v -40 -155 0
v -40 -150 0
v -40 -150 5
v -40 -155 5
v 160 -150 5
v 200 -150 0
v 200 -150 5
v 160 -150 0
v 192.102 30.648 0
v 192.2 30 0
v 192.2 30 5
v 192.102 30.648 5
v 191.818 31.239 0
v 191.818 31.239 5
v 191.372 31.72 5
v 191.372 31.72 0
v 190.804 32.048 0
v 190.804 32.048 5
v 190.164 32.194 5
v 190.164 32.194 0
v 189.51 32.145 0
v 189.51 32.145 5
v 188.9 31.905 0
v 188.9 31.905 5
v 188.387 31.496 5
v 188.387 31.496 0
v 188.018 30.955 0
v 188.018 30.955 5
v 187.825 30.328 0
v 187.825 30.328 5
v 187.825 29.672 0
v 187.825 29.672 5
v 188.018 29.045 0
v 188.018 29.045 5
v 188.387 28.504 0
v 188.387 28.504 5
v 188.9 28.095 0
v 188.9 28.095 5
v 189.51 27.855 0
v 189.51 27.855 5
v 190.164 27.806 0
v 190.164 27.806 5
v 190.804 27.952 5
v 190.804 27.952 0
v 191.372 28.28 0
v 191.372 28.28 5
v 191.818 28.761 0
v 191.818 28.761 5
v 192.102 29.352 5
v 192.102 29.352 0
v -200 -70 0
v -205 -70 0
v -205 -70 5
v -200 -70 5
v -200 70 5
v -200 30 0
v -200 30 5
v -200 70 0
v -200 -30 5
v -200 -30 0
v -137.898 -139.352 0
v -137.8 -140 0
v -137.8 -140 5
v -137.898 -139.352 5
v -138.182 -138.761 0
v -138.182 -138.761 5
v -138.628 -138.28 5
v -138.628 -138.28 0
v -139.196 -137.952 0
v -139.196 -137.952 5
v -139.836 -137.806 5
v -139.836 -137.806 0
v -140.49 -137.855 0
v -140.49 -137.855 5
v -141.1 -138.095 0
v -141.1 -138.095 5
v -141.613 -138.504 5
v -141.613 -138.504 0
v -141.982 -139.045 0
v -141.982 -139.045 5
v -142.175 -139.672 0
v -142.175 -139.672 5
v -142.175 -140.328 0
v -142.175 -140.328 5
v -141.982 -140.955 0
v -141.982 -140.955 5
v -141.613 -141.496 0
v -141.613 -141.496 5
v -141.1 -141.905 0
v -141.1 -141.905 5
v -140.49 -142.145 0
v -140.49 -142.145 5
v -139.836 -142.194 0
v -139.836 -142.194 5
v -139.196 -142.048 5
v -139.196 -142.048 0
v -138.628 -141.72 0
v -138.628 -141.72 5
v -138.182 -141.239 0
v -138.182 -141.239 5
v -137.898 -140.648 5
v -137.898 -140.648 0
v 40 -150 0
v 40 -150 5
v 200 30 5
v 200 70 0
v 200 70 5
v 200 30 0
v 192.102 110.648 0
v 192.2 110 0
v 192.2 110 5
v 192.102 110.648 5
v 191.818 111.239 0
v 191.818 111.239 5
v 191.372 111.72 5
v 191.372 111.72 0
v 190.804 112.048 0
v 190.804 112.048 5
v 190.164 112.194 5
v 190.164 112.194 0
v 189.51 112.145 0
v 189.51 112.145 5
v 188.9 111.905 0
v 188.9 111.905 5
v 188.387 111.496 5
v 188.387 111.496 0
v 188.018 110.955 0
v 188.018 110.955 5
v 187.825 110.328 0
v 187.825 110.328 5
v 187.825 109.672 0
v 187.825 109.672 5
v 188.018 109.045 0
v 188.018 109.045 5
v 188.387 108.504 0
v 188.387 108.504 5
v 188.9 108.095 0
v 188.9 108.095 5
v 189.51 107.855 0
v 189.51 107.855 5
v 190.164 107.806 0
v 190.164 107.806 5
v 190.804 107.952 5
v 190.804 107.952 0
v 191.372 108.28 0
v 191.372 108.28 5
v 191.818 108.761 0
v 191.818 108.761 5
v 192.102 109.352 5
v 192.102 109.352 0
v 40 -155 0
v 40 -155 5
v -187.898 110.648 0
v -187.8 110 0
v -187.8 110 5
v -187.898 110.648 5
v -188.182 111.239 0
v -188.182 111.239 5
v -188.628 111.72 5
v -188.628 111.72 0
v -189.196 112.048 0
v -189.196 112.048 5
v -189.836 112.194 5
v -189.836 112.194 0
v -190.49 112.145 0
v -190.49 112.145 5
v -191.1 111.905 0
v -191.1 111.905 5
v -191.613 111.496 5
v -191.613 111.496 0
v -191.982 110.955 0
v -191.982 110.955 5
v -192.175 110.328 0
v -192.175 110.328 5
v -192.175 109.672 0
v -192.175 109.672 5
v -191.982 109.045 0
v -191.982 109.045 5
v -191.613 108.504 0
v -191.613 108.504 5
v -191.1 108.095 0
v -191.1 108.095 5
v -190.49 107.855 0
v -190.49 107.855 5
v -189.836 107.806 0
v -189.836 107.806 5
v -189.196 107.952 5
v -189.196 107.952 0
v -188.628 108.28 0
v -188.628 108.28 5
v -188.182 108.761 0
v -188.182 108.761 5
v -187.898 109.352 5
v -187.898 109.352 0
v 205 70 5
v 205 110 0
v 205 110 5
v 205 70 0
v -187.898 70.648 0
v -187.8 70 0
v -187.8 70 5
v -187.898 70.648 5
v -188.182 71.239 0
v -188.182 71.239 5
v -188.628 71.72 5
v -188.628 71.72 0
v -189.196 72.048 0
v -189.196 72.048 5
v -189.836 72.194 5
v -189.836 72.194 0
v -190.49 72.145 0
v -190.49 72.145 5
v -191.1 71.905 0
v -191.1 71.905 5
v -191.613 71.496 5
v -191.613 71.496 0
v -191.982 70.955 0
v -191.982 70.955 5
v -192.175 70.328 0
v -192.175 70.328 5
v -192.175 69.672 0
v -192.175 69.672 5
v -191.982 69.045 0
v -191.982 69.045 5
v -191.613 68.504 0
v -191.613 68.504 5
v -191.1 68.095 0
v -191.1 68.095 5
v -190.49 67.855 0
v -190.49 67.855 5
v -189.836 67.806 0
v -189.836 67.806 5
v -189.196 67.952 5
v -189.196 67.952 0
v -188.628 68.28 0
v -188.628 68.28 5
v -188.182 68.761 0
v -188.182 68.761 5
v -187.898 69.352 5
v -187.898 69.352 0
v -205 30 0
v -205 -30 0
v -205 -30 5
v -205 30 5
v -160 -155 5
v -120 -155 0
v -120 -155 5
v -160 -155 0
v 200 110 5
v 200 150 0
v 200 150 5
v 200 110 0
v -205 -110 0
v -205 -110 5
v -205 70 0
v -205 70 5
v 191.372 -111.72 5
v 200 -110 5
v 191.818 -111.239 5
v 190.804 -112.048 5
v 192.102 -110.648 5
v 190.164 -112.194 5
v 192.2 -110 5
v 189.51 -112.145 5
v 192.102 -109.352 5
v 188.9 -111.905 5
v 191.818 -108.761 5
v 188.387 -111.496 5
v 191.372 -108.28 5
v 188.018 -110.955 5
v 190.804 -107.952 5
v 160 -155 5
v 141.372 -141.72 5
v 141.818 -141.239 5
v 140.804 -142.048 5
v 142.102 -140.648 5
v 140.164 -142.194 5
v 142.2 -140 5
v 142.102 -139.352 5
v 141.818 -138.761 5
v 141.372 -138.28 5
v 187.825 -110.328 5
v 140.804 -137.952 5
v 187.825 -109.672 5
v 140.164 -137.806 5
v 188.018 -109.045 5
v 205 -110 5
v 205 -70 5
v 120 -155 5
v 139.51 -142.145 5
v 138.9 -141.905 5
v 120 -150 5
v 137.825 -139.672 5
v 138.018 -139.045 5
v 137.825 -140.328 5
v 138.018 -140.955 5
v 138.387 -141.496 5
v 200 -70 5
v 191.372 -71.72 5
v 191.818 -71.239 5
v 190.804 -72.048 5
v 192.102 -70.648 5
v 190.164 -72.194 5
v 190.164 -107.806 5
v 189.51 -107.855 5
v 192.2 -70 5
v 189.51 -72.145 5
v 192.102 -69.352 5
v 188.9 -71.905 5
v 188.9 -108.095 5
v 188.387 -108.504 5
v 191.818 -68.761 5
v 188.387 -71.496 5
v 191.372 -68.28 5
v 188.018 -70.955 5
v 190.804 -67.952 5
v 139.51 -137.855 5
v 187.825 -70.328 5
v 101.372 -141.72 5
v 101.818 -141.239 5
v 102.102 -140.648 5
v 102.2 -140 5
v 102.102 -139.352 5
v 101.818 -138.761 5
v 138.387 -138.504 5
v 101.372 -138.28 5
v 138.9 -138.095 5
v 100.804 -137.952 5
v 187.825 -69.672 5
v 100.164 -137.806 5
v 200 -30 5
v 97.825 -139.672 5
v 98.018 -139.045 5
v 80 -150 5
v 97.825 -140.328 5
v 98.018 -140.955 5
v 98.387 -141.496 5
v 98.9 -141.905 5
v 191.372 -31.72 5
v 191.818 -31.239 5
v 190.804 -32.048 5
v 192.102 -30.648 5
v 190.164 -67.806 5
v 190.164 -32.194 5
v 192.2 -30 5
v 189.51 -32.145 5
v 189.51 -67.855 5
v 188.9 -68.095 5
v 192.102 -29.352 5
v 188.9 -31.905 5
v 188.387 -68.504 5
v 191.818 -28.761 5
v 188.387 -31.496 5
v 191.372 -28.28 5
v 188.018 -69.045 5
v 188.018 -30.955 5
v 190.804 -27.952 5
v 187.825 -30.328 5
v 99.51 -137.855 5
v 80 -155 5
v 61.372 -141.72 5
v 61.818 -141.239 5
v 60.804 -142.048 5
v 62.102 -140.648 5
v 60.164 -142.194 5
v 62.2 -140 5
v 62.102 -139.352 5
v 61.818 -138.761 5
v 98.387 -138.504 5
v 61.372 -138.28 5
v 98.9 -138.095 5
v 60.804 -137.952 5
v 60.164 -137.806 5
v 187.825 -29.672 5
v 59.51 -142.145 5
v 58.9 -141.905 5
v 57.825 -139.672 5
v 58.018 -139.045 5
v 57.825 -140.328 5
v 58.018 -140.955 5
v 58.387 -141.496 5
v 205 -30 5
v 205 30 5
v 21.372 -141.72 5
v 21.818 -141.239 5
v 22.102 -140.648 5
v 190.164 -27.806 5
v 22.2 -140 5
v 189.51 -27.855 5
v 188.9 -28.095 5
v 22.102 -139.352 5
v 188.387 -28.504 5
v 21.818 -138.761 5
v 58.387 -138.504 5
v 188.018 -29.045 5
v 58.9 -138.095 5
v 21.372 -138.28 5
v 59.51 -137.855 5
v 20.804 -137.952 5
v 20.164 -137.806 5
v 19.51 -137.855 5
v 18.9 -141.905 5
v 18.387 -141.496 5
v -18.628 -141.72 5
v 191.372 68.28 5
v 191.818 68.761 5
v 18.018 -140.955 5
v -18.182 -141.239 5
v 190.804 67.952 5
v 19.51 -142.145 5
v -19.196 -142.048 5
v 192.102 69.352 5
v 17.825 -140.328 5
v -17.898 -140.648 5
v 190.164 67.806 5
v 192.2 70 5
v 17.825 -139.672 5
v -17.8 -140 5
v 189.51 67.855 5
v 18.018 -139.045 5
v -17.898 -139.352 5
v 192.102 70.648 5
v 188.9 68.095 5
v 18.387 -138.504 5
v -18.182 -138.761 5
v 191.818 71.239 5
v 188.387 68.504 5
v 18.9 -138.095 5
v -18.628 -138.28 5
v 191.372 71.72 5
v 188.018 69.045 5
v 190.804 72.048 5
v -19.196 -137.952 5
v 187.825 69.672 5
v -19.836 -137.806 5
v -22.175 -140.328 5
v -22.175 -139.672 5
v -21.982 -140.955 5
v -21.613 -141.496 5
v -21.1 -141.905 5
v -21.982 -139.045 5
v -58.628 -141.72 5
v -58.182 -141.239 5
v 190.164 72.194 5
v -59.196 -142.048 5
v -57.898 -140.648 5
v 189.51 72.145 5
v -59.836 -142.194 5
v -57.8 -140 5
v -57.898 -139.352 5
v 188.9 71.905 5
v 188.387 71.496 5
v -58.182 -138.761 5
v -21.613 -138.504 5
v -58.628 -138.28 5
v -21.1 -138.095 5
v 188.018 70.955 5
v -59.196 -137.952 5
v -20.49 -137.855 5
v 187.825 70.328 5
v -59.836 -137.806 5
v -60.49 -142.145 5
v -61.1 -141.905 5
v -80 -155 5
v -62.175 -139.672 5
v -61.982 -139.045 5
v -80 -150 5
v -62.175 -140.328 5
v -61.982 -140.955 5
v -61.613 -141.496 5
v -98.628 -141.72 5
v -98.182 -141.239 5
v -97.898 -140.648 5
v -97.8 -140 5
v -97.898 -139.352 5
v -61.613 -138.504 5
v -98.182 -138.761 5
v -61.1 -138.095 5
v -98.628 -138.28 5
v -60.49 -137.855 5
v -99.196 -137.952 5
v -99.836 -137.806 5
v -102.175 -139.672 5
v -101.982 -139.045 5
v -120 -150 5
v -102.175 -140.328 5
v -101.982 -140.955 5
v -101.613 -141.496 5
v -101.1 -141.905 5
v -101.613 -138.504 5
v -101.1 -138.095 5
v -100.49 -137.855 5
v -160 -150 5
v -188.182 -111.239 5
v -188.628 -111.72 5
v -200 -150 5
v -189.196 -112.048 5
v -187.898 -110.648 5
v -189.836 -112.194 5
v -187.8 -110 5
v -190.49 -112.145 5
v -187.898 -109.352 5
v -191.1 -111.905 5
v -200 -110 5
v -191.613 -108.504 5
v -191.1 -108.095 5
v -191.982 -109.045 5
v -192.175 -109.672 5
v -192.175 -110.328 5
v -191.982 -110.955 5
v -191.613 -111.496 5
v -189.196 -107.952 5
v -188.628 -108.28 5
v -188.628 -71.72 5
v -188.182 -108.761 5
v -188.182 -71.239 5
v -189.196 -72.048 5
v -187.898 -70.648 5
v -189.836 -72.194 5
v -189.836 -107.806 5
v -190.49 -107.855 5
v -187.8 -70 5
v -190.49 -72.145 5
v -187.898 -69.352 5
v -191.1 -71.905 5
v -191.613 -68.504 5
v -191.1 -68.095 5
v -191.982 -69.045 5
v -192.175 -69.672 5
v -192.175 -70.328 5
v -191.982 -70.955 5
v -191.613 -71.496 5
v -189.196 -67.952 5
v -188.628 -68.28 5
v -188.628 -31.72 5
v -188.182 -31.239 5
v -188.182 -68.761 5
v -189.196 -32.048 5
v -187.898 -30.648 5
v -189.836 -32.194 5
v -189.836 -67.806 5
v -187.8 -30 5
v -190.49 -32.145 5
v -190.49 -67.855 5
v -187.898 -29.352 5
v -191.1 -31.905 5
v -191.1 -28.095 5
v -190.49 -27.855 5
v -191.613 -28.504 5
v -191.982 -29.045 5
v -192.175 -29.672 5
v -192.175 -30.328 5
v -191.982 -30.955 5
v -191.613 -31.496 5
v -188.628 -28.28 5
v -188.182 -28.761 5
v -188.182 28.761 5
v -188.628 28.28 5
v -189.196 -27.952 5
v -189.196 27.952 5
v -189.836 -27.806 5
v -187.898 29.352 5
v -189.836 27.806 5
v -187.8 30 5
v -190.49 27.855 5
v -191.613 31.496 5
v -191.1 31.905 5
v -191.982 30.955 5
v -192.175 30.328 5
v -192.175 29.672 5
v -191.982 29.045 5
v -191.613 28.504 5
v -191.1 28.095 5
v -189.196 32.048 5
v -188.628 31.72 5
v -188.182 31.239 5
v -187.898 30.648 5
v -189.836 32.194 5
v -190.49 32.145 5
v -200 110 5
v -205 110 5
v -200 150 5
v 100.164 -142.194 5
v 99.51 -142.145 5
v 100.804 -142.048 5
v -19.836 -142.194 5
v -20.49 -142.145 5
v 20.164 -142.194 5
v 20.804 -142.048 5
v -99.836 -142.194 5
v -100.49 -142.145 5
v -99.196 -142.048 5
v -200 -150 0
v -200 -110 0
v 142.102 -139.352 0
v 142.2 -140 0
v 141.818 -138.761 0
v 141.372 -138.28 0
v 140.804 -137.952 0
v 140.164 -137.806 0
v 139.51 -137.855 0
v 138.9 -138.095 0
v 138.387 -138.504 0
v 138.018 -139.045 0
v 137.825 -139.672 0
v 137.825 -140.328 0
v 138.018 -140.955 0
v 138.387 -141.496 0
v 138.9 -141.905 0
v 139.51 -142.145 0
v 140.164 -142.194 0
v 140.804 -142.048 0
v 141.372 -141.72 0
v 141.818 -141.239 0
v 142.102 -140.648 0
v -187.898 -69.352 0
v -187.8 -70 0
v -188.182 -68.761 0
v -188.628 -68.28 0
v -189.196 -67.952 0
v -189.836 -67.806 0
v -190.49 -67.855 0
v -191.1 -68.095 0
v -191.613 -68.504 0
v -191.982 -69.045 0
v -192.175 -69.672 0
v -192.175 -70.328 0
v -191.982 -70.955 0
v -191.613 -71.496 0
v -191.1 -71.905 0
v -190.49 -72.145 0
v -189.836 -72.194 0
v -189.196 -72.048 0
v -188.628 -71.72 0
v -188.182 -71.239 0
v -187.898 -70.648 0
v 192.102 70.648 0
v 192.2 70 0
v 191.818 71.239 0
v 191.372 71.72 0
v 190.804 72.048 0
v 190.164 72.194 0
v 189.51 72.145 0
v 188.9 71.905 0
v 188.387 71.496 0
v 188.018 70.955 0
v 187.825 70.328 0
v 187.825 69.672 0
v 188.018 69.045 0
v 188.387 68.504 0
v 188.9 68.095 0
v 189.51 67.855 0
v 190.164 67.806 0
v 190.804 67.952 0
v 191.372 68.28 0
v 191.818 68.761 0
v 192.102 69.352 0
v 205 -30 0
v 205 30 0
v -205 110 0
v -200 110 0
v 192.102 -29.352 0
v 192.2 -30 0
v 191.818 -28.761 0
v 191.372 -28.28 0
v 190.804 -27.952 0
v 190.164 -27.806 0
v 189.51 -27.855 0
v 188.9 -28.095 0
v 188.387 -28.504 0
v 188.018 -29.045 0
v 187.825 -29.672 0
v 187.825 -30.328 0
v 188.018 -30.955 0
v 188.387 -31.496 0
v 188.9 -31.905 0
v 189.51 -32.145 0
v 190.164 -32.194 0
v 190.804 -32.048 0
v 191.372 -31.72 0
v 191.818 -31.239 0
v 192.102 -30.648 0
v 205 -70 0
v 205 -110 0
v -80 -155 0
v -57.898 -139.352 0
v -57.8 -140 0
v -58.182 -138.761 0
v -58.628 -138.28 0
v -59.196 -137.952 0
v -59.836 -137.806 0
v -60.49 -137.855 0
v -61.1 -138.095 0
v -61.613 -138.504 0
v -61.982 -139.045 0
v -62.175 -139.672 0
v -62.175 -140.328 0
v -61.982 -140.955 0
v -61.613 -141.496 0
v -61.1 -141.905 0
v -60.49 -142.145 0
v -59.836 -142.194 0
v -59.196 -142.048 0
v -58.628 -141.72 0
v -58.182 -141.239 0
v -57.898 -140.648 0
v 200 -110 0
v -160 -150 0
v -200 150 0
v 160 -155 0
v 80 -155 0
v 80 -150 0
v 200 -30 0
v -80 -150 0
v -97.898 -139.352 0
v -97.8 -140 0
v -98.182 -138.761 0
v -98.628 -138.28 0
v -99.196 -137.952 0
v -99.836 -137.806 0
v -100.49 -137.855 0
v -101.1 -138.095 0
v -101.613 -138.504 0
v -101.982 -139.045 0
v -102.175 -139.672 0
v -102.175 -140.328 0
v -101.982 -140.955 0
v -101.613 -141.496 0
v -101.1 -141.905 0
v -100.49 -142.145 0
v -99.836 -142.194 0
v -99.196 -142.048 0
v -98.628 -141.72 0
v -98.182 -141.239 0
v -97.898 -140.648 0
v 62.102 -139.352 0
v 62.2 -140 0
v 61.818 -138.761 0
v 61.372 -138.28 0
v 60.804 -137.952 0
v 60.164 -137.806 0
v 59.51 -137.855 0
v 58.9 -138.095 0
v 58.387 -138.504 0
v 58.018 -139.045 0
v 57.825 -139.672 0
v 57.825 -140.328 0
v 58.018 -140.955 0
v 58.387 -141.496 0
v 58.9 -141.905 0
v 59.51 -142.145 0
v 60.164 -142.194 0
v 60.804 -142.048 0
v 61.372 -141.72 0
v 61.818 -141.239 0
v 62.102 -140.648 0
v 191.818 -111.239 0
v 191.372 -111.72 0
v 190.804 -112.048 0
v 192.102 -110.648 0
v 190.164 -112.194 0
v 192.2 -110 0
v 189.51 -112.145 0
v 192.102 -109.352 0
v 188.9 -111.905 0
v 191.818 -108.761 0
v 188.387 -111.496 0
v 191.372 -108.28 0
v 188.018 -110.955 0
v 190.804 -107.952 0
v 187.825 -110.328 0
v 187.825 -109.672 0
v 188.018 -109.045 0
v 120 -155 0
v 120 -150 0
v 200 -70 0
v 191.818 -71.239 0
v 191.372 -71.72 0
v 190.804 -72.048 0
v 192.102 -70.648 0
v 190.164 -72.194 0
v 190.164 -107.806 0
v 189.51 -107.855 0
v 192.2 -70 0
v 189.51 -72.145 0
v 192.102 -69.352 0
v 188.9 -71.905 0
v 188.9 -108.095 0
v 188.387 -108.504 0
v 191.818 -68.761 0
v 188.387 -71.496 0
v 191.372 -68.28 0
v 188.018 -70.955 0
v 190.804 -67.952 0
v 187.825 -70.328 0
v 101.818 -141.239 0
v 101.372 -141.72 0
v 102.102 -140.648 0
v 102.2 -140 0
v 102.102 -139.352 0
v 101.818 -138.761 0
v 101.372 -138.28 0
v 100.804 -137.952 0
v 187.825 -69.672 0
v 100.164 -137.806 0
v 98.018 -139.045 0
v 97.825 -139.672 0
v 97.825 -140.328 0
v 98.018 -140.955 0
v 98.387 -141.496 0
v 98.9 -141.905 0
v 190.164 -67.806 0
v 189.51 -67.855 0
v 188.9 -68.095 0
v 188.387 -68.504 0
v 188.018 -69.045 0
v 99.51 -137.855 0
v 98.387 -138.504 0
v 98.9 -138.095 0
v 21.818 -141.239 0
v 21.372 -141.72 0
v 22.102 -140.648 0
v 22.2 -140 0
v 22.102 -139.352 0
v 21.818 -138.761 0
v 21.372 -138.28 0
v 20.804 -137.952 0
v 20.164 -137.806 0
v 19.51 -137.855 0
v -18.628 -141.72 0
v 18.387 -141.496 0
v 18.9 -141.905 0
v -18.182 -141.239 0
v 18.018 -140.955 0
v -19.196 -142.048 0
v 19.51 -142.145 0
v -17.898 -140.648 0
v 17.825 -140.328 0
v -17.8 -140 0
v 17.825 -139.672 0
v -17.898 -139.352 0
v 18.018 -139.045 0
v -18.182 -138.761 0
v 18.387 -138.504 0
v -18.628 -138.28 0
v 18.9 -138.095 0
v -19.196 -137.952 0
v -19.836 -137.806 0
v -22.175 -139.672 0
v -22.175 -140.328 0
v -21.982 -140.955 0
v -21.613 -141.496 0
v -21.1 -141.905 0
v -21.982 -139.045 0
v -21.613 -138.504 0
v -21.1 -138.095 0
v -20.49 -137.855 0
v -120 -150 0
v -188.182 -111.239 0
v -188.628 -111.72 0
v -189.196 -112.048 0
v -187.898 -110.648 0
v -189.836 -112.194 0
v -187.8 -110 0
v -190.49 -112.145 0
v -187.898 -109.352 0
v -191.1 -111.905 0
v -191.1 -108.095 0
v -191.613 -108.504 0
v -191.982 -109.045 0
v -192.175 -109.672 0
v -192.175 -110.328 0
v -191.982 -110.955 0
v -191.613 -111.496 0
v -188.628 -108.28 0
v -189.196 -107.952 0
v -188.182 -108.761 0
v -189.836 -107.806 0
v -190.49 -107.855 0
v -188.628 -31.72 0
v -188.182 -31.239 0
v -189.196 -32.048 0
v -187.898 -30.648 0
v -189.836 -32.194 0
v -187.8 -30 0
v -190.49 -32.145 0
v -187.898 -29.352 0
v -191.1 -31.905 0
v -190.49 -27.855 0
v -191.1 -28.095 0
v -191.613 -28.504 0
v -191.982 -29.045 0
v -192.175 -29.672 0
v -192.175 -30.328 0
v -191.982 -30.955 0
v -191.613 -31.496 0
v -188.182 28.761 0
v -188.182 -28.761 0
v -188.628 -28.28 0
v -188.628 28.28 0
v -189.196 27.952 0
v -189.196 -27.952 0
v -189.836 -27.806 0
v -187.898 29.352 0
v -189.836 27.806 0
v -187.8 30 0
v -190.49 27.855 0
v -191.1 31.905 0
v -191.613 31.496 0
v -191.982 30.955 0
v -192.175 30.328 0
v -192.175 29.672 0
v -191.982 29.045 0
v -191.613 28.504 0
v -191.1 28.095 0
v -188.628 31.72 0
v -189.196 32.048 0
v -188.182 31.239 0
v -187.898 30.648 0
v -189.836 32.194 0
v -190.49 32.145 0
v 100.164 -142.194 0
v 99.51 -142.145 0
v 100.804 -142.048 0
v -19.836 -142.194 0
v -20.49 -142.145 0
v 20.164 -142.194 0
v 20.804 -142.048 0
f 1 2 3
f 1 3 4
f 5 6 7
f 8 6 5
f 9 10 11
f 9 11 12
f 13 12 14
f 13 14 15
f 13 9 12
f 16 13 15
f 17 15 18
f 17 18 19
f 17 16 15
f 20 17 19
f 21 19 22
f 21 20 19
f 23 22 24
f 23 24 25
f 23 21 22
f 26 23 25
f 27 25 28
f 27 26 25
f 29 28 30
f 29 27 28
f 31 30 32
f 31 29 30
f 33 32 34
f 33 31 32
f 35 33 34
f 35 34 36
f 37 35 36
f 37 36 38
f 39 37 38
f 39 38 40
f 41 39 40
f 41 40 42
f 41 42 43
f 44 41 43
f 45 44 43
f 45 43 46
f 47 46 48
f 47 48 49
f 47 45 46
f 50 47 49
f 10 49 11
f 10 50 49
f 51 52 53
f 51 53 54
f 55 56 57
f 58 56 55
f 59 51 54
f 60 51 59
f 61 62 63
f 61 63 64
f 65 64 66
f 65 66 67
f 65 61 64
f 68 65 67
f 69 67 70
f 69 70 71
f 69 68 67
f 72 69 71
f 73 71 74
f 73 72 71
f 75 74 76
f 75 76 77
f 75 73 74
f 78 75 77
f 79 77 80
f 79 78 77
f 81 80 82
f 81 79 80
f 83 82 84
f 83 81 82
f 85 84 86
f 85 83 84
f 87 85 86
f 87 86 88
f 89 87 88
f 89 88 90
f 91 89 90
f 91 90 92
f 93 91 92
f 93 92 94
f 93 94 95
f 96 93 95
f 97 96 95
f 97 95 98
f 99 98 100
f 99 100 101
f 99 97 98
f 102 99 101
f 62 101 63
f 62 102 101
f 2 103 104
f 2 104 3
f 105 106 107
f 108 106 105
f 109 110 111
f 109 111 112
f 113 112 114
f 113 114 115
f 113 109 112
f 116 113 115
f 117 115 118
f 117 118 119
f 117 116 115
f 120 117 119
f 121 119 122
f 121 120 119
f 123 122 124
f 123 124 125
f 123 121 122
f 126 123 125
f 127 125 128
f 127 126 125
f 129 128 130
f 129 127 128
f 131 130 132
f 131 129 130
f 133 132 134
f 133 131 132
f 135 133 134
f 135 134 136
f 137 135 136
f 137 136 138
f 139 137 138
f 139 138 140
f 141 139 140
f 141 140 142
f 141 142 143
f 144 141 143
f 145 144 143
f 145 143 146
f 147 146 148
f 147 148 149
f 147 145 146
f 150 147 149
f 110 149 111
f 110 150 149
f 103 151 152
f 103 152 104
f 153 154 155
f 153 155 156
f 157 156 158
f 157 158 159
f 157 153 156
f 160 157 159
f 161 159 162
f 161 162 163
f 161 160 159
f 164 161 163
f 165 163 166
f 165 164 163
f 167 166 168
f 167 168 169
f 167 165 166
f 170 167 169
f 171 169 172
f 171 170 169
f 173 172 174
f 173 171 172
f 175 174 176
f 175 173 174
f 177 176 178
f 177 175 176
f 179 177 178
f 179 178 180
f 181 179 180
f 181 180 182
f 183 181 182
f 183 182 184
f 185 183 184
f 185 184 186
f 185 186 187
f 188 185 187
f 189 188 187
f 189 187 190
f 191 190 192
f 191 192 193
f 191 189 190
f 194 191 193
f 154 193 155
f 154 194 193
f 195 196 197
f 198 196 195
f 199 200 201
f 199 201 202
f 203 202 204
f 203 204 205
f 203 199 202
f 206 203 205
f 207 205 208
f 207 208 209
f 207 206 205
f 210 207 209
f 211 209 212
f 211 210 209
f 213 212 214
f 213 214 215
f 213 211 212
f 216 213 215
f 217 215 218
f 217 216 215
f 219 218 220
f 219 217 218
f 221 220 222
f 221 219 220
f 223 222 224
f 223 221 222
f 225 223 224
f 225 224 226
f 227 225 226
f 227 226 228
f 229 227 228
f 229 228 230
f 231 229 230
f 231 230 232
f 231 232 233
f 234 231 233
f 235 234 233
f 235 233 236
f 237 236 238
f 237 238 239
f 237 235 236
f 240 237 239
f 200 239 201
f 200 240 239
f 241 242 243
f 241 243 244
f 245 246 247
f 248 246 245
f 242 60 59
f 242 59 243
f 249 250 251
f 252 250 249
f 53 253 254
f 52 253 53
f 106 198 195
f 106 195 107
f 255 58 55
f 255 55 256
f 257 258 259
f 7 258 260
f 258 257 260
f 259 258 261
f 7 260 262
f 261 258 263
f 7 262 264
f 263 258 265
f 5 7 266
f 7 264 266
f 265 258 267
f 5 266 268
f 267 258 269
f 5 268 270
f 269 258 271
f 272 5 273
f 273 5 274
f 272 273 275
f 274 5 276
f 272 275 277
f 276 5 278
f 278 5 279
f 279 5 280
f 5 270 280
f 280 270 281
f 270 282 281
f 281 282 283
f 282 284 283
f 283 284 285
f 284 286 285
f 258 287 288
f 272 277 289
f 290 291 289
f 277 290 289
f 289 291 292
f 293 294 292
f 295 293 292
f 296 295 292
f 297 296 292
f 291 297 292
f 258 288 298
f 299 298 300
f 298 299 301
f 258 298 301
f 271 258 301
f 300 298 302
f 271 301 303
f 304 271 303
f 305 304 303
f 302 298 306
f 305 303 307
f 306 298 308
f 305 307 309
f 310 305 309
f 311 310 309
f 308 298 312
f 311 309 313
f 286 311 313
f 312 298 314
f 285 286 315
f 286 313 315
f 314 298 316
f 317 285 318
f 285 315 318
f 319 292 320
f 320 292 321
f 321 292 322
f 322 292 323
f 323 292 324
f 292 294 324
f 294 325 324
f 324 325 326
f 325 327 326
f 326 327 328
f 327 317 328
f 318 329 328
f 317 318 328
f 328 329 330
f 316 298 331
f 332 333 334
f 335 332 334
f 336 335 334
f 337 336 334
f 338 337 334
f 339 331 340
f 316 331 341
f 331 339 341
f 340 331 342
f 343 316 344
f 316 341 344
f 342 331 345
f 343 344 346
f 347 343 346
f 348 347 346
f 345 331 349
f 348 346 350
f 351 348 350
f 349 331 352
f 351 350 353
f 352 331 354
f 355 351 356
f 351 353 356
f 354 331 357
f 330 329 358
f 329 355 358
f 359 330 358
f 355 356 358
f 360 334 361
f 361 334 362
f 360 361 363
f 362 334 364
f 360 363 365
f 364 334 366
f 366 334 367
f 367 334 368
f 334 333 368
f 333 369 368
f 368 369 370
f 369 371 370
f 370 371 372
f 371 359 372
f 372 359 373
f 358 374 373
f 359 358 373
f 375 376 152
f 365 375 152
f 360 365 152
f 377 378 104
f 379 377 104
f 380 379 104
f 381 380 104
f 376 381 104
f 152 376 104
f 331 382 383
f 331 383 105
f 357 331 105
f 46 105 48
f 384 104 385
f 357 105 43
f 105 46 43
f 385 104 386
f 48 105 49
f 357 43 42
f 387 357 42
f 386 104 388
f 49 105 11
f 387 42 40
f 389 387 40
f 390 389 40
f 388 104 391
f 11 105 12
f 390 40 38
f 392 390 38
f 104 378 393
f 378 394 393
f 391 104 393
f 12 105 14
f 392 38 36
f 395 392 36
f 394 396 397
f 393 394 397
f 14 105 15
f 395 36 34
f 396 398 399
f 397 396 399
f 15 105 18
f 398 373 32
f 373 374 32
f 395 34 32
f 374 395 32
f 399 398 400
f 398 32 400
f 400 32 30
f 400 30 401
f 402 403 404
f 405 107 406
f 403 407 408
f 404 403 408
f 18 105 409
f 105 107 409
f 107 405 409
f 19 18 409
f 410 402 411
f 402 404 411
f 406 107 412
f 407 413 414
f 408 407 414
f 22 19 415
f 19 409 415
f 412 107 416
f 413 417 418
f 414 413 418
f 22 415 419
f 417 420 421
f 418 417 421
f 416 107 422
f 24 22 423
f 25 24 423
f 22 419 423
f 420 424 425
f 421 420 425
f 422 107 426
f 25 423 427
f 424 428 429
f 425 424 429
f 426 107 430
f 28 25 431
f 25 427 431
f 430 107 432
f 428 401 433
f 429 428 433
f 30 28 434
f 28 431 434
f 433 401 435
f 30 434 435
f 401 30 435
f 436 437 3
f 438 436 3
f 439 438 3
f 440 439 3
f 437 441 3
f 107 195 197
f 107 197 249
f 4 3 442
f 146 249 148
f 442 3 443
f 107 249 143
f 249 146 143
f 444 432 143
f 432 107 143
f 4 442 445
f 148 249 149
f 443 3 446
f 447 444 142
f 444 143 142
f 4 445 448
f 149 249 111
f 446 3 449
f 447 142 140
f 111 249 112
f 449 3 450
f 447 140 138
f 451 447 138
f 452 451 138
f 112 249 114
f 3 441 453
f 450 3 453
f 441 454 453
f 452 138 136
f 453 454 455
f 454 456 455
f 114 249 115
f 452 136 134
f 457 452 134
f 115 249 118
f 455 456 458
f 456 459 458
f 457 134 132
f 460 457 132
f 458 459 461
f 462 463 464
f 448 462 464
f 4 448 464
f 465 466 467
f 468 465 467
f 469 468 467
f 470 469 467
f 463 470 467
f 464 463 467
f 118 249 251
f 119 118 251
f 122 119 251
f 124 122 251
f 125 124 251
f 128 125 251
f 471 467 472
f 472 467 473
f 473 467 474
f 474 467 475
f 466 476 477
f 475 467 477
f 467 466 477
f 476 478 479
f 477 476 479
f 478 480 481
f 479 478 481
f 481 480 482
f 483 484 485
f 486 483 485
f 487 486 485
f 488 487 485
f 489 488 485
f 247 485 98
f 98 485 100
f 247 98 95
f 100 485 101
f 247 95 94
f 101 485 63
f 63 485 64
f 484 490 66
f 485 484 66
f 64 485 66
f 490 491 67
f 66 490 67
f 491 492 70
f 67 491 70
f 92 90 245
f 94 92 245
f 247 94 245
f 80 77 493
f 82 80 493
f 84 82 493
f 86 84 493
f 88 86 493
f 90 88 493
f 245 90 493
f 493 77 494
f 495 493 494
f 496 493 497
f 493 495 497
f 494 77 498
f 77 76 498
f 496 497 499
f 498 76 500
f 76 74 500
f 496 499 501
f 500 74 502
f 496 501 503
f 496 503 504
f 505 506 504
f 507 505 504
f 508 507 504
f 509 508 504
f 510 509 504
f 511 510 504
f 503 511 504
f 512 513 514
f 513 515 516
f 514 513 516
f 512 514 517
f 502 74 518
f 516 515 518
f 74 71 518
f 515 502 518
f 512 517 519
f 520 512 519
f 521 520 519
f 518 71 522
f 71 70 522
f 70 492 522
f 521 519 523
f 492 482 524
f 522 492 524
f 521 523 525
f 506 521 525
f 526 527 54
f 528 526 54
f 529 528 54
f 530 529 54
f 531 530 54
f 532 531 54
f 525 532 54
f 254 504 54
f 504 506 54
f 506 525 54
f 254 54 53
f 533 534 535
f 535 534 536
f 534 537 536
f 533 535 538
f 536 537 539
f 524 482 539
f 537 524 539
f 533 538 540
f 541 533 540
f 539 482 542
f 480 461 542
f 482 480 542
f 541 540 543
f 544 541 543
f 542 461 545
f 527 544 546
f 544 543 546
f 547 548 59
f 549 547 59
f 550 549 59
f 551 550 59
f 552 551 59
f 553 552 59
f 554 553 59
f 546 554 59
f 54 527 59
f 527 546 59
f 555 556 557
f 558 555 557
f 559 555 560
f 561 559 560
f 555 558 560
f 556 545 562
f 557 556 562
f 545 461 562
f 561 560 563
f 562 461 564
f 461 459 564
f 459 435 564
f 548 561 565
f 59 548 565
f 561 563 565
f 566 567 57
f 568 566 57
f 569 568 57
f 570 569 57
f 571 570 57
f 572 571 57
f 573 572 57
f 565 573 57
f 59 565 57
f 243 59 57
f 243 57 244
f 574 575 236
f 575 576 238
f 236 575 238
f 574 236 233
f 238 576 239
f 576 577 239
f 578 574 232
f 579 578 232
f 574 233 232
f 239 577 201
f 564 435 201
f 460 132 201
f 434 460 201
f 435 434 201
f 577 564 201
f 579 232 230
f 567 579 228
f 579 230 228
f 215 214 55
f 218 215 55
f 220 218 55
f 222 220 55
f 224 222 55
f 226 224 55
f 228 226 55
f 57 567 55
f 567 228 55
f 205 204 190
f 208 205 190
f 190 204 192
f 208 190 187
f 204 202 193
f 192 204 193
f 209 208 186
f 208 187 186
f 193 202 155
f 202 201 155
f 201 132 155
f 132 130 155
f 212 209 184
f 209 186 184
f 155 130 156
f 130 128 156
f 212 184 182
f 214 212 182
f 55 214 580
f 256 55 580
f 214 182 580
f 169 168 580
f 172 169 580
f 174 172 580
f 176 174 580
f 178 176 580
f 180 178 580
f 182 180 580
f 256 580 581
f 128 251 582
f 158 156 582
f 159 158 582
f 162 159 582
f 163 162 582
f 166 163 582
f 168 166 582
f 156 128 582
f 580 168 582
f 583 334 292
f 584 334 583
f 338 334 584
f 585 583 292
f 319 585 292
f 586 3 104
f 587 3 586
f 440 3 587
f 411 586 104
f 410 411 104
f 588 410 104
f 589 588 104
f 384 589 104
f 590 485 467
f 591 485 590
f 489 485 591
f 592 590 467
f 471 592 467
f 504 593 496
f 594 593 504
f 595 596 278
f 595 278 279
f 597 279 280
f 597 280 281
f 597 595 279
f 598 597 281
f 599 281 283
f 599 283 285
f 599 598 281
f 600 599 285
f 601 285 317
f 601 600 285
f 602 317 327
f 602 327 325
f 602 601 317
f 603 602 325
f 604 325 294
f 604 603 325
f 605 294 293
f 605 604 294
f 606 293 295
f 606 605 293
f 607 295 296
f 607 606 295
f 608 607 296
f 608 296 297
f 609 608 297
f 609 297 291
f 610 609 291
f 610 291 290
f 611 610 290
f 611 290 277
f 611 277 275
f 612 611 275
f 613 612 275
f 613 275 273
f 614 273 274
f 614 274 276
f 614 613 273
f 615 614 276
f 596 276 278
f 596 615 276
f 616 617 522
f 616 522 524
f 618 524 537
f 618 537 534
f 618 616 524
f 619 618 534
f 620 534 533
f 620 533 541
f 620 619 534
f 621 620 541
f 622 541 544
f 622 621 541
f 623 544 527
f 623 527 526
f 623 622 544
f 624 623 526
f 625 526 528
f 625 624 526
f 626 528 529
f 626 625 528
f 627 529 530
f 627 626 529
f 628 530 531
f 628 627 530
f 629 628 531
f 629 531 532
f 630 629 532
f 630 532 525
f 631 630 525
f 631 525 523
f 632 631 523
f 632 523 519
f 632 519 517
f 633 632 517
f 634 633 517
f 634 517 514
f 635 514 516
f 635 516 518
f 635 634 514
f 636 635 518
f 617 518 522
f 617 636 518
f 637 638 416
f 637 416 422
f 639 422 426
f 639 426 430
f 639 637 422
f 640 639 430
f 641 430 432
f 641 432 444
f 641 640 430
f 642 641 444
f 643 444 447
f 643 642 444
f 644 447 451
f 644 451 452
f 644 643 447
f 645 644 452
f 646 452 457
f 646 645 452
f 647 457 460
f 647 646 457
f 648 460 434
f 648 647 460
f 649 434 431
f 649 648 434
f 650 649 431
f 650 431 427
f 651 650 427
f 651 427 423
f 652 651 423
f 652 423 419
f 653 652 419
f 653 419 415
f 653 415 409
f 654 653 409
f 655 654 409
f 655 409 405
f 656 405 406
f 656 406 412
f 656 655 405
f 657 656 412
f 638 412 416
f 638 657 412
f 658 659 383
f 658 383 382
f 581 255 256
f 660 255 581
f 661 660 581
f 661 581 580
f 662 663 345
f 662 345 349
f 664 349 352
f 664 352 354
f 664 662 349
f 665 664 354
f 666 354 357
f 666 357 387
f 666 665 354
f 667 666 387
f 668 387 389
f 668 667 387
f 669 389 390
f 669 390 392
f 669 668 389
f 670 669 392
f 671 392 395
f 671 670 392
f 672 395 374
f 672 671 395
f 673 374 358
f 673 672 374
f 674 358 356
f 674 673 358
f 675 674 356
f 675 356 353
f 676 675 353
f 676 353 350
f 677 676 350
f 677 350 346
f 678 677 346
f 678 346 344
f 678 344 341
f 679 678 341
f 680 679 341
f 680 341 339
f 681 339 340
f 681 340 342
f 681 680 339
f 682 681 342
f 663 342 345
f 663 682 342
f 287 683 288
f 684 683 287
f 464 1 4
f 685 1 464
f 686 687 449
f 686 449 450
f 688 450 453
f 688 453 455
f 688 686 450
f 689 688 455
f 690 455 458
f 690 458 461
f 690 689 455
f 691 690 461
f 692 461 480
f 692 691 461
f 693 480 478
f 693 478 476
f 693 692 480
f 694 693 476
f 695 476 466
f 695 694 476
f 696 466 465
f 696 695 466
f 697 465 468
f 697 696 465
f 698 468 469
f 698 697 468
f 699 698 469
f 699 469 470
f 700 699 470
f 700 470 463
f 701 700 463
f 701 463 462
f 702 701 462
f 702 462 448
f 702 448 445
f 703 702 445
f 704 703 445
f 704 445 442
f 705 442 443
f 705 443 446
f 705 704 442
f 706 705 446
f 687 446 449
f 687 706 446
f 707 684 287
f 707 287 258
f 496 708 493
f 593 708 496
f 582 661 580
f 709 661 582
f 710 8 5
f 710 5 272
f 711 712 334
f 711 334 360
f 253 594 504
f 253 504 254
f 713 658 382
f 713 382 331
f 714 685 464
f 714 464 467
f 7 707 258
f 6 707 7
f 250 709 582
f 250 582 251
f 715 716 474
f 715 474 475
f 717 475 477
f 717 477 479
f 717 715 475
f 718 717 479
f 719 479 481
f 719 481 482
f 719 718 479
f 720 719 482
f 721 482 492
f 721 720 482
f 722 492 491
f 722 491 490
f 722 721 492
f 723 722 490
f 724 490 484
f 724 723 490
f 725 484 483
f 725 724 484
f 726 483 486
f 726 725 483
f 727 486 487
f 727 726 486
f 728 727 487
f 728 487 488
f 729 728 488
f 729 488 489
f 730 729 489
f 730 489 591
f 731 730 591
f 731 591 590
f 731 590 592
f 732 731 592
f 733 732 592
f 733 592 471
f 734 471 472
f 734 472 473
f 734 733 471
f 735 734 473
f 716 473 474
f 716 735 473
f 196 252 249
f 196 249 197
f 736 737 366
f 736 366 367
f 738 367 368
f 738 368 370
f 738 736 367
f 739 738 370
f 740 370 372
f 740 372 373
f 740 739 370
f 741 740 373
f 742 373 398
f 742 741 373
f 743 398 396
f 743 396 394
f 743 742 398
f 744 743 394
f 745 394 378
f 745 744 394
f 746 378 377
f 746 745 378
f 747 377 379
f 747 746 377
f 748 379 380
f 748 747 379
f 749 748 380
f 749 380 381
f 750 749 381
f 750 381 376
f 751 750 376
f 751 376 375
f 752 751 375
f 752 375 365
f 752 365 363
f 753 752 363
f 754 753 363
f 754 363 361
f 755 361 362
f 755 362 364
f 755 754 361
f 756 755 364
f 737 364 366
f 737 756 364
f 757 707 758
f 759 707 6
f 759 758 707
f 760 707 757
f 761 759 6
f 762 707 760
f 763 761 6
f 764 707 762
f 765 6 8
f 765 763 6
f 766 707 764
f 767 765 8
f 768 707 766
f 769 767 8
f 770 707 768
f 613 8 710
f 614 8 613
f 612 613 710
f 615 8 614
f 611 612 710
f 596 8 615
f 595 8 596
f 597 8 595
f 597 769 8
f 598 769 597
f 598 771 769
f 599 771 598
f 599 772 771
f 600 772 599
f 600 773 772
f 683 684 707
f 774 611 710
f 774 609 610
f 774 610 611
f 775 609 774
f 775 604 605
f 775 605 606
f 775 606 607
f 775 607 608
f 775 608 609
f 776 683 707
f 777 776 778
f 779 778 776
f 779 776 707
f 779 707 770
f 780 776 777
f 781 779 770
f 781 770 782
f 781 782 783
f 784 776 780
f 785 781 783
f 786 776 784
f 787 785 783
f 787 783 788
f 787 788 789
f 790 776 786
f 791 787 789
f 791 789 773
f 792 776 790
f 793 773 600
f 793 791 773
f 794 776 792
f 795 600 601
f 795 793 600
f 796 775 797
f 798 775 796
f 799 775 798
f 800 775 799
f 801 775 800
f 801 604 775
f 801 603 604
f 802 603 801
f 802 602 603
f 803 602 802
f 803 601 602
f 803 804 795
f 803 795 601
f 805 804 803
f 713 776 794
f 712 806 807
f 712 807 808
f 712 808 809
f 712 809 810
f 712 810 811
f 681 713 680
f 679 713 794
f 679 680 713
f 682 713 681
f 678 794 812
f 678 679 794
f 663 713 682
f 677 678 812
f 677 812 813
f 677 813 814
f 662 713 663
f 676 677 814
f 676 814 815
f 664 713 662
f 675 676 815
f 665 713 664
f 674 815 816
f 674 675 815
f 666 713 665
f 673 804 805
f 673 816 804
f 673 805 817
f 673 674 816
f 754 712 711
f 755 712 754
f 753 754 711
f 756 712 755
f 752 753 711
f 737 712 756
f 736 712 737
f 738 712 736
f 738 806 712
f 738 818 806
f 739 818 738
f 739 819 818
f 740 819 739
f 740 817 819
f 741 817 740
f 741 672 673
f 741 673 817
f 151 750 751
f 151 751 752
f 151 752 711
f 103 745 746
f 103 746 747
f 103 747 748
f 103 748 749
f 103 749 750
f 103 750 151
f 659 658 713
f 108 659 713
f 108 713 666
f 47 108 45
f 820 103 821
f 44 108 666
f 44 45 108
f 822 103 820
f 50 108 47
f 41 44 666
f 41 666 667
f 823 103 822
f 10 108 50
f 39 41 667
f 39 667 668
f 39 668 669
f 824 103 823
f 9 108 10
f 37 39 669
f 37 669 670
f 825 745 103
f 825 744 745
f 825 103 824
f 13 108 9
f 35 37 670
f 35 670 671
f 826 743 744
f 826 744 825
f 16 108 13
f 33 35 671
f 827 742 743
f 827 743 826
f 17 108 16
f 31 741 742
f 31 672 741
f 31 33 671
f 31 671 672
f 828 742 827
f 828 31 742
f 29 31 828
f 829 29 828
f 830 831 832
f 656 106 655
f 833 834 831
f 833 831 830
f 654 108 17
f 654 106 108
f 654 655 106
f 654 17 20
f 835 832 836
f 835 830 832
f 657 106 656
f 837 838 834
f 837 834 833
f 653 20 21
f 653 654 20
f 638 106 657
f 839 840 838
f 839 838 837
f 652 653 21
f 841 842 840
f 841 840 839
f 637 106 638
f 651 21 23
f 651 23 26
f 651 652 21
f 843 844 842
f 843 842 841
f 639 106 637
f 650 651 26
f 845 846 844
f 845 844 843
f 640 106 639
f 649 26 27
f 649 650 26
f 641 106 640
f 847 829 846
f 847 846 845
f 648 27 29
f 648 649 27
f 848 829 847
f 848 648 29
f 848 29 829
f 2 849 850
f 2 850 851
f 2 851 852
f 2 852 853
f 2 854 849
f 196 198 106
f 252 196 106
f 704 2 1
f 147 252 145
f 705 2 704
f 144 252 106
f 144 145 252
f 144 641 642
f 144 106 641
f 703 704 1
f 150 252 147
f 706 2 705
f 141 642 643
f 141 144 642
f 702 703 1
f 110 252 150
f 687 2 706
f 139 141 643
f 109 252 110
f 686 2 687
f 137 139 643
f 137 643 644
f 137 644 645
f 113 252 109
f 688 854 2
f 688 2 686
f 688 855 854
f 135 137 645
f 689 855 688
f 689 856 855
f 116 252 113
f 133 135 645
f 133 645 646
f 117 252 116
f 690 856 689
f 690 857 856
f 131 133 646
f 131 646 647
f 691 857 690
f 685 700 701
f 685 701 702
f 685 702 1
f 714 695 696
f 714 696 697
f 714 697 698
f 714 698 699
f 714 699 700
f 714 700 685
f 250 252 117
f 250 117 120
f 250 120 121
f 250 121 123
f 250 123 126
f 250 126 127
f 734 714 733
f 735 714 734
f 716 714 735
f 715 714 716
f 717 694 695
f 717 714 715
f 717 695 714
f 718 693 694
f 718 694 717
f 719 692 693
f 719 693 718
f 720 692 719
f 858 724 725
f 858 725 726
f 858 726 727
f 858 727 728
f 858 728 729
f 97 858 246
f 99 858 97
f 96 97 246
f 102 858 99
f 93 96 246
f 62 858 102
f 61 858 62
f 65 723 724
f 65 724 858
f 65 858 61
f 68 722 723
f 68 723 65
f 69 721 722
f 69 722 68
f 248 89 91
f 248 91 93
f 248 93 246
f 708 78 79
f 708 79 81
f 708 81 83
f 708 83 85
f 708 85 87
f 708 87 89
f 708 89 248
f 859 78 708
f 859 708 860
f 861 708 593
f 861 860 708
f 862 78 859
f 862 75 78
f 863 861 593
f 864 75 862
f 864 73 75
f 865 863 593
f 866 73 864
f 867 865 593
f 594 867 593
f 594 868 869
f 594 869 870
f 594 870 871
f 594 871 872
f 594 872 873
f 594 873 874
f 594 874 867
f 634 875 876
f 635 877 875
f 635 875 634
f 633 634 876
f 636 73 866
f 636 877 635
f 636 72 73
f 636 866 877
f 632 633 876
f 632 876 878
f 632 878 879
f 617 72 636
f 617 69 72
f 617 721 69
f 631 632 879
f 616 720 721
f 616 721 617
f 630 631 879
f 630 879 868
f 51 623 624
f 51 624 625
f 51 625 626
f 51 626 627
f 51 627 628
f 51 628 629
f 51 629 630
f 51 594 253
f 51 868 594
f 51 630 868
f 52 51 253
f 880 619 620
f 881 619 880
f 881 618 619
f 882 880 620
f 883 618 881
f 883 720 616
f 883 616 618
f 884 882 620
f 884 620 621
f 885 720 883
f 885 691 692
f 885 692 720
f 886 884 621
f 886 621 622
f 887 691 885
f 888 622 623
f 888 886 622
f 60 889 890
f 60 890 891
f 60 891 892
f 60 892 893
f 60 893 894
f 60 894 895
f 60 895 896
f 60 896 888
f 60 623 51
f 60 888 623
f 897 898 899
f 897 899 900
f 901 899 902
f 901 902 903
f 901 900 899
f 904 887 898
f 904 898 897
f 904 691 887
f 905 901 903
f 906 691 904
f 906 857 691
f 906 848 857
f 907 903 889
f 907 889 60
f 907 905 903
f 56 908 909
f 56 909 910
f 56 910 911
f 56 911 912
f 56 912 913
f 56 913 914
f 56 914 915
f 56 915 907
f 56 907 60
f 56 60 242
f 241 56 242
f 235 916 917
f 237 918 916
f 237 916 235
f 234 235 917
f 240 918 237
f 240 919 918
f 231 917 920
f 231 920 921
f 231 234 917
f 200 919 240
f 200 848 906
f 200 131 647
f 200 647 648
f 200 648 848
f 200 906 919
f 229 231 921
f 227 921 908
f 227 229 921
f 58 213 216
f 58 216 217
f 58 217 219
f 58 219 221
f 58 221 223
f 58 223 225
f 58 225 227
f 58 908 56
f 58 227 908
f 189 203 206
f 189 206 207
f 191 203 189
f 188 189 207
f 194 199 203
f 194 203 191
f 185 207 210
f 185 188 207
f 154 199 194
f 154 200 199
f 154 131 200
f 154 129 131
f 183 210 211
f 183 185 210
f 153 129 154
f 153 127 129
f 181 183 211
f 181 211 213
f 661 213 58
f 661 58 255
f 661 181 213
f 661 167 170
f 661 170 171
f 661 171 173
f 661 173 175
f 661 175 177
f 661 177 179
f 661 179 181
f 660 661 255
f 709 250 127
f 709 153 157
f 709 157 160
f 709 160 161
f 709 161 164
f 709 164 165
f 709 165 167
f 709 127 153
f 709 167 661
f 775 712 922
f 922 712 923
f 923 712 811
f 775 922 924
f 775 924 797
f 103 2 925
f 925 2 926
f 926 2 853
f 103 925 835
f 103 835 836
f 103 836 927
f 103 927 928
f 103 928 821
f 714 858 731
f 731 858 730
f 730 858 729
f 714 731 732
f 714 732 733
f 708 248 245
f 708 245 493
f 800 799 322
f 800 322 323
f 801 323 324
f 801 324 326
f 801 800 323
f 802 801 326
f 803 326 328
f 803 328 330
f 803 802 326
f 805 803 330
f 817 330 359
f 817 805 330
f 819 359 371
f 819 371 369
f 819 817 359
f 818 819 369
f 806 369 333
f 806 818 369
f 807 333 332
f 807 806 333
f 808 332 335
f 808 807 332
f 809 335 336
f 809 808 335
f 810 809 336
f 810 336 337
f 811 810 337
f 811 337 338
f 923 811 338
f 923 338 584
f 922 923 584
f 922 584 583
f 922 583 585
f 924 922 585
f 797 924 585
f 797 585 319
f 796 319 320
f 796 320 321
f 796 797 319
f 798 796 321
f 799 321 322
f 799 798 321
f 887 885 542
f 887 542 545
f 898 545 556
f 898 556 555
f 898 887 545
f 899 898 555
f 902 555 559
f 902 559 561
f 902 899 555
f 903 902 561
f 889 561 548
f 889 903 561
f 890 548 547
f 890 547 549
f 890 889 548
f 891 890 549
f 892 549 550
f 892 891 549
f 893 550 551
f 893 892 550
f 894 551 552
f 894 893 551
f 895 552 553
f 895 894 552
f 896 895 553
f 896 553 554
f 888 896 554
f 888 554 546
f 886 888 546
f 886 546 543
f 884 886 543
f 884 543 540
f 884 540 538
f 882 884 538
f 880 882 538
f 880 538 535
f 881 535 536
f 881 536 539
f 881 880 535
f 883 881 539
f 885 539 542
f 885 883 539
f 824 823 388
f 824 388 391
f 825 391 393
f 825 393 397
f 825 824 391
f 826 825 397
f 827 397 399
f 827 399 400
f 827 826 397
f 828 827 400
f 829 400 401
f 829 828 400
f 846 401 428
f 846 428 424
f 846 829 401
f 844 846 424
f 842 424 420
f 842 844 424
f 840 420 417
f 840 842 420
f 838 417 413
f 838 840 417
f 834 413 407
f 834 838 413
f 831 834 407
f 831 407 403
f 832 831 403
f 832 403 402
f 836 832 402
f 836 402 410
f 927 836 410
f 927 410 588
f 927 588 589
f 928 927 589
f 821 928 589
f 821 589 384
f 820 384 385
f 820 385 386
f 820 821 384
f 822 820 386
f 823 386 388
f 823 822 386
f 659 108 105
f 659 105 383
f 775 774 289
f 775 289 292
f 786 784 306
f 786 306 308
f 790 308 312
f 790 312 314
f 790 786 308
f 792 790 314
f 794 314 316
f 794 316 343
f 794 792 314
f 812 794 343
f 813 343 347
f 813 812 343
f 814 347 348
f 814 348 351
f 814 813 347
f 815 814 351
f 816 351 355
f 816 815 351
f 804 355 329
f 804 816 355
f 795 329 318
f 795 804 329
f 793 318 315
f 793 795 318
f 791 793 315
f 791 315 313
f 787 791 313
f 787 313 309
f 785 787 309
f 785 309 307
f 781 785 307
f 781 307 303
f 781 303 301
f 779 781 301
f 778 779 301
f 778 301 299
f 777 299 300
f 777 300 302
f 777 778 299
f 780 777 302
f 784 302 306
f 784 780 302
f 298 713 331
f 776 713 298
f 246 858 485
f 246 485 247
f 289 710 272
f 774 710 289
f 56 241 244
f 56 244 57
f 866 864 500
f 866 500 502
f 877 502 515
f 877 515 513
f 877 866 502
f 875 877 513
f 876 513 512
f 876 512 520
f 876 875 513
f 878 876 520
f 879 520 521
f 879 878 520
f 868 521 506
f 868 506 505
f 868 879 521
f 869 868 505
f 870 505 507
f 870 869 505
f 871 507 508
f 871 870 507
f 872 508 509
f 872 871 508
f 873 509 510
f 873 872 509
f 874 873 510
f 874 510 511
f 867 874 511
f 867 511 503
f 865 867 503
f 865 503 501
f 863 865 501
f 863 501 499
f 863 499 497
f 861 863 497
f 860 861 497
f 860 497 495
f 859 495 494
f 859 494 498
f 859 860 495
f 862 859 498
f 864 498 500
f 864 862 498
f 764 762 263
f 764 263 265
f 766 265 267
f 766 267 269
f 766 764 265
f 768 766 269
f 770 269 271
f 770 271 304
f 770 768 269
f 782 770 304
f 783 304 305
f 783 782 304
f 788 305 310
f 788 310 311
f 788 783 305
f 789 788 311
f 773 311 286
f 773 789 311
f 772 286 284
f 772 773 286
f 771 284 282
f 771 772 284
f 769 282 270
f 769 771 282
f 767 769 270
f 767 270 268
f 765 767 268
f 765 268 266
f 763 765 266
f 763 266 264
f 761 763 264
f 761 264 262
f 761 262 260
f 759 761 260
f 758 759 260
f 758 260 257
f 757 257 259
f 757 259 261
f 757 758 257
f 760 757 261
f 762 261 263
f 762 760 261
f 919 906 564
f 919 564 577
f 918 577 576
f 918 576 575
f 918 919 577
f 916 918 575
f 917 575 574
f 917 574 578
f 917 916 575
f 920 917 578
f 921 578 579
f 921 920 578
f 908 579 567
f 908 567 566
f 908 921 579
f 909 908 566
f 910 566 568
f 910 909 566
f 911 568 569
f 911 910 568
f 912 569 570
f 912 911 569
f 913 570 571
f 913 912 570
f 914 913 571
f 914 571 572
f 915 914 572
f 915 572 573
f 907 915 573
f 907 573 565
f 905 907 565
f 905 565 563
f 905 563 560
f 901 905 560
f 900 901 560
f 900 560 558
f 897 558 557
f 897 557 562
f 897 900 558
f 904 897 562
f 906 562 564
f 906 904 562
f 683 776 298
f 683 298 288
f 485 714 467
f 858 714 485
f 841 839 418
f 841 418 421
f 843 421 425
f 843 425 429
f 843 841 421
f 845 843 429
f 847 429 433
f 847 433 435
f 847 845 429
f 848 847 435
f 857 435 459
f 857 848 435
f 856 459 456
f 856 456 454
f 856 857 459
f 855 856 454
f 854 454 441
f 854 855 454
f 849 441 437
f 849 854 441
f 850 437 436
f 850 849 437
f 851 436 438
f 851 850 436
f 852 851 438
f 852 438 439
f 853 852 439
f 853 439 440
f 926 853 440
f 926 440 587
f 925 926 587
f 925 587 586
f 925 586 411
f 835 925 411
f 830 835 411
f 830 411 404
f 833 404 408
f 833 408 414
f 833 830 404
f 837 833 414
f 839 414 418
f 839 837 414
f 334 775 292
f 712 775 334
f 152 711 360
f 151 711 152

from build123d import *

# Parameters (mm, degrees)
SKETCH_1_R      = 2.2
EXTRUDE_1_DEPTH = 5


with BuildPart() as part:
    # 草图1 → 凸台-拉伸1 (new body)
    with BuildSketch(Plane.XY):
        Polygon((-200, 150), (200, 150), (200, 110), (205, 110), (205, 70), (200, 70), (200, 30), (205, 30), (205, -30), (200, -30), (200, -70), (205, -70), (205, -110), (200, -110), (200, -150), (160, -150), (160, -155), (120, -155), (120, -150), (80, -150), (80, -155), (40, -155), (40, -150), (-40, -150), (-40, -155), (-80, -155), (-80, -150), (-120, -150), (-120, -155), (-160, -155), (-160, -150), (-200, -150), (-200, -110), (-205, -110), (-205, -70), (-200, -70), (-200, -30), (-205, -30), (-205, 30), (-200, 30), (-200, 70), (-205, 70), (-205, 110), (-200, 110), align=None)
        with Locations((-140, -140)):
            Circle(SKETCH_1_R, mode=Mode.SUBTRACT)
        with Locations((-100, -140)):
            Circle(SKETCH_1_R, mode=Mode.SUBTRACT)
        with Locations((-60, -140)):
            Circle(SKETCH_1_R, mode=Mode.SUBTRACT)
        with Locations((-20, -140)):
            Circle(SKETCH_1_R, mode=Mode.SUBTRACT)
        with Locations((20, -140)):
            Circle(SKETCH_1_R, mode=Mode.SUBTRACT)
        with Locations((60, -140)):
            Circle(SKETCH_1_R, mode=Mode.SUBTRACT)
        with Locations((100, -140)):
            Circle(SKETCH_1_R, mode=Mode.SUBTRACT)
        with Locations((140, -140)):
            Circle(SKETCH_1_R, mode=Mode.SUBTRACT)
        with Locations((-190, 110)):
            Circle(SKETCH_1_R, mode=Mode.SUBTRACT)
        with Locations((-190, 70)):
            Circle(SKETCH_1_R, mode=Mode.SUBTRACT)
        with Locations((-190, 30)):
            Circle(SKETCH_1_R, mode=Mode.SUBTRACT)
        with Locations((-190, -30)):
            Circle(SKETCH_1_R, mode=Mode.SUBTRACT)
        with Locations((-190, -70)):
            Circle(SKETCH_1_R, mode=Mode.SUBTRACT)
        with Locations((-190, -110)):
            Circle(SKETCH_1_R, mode=Mode.SUBTRACT)
        with Locations((190, -110)):
            Circle(SKETCH_1_R, mode=Mode.SUBTRACT)
        with Locations((190, -70)):
            Circle(SKETCH_1_R, mode=Mode.SUBTRACT)
        with Locations((190, -30)):
            Circle(SKETCH_1_R, mode=Mode.SUBTRACT)
        with Locations((190, 30)):
            Circle(SKETCH_1_R, mode=Mode.SUBTRACT)
        with Locations((190, 70)):
            Circle(SKETCH_1_R, mode=Mode.SUBTRACT)
        with Locations((190, 110)):
            Circle(SKETCH_1_R, mode=Mode.SUBTRACT)
    extrude(amount=EXTRUDE_1_DEPTH)


solid = part.part
